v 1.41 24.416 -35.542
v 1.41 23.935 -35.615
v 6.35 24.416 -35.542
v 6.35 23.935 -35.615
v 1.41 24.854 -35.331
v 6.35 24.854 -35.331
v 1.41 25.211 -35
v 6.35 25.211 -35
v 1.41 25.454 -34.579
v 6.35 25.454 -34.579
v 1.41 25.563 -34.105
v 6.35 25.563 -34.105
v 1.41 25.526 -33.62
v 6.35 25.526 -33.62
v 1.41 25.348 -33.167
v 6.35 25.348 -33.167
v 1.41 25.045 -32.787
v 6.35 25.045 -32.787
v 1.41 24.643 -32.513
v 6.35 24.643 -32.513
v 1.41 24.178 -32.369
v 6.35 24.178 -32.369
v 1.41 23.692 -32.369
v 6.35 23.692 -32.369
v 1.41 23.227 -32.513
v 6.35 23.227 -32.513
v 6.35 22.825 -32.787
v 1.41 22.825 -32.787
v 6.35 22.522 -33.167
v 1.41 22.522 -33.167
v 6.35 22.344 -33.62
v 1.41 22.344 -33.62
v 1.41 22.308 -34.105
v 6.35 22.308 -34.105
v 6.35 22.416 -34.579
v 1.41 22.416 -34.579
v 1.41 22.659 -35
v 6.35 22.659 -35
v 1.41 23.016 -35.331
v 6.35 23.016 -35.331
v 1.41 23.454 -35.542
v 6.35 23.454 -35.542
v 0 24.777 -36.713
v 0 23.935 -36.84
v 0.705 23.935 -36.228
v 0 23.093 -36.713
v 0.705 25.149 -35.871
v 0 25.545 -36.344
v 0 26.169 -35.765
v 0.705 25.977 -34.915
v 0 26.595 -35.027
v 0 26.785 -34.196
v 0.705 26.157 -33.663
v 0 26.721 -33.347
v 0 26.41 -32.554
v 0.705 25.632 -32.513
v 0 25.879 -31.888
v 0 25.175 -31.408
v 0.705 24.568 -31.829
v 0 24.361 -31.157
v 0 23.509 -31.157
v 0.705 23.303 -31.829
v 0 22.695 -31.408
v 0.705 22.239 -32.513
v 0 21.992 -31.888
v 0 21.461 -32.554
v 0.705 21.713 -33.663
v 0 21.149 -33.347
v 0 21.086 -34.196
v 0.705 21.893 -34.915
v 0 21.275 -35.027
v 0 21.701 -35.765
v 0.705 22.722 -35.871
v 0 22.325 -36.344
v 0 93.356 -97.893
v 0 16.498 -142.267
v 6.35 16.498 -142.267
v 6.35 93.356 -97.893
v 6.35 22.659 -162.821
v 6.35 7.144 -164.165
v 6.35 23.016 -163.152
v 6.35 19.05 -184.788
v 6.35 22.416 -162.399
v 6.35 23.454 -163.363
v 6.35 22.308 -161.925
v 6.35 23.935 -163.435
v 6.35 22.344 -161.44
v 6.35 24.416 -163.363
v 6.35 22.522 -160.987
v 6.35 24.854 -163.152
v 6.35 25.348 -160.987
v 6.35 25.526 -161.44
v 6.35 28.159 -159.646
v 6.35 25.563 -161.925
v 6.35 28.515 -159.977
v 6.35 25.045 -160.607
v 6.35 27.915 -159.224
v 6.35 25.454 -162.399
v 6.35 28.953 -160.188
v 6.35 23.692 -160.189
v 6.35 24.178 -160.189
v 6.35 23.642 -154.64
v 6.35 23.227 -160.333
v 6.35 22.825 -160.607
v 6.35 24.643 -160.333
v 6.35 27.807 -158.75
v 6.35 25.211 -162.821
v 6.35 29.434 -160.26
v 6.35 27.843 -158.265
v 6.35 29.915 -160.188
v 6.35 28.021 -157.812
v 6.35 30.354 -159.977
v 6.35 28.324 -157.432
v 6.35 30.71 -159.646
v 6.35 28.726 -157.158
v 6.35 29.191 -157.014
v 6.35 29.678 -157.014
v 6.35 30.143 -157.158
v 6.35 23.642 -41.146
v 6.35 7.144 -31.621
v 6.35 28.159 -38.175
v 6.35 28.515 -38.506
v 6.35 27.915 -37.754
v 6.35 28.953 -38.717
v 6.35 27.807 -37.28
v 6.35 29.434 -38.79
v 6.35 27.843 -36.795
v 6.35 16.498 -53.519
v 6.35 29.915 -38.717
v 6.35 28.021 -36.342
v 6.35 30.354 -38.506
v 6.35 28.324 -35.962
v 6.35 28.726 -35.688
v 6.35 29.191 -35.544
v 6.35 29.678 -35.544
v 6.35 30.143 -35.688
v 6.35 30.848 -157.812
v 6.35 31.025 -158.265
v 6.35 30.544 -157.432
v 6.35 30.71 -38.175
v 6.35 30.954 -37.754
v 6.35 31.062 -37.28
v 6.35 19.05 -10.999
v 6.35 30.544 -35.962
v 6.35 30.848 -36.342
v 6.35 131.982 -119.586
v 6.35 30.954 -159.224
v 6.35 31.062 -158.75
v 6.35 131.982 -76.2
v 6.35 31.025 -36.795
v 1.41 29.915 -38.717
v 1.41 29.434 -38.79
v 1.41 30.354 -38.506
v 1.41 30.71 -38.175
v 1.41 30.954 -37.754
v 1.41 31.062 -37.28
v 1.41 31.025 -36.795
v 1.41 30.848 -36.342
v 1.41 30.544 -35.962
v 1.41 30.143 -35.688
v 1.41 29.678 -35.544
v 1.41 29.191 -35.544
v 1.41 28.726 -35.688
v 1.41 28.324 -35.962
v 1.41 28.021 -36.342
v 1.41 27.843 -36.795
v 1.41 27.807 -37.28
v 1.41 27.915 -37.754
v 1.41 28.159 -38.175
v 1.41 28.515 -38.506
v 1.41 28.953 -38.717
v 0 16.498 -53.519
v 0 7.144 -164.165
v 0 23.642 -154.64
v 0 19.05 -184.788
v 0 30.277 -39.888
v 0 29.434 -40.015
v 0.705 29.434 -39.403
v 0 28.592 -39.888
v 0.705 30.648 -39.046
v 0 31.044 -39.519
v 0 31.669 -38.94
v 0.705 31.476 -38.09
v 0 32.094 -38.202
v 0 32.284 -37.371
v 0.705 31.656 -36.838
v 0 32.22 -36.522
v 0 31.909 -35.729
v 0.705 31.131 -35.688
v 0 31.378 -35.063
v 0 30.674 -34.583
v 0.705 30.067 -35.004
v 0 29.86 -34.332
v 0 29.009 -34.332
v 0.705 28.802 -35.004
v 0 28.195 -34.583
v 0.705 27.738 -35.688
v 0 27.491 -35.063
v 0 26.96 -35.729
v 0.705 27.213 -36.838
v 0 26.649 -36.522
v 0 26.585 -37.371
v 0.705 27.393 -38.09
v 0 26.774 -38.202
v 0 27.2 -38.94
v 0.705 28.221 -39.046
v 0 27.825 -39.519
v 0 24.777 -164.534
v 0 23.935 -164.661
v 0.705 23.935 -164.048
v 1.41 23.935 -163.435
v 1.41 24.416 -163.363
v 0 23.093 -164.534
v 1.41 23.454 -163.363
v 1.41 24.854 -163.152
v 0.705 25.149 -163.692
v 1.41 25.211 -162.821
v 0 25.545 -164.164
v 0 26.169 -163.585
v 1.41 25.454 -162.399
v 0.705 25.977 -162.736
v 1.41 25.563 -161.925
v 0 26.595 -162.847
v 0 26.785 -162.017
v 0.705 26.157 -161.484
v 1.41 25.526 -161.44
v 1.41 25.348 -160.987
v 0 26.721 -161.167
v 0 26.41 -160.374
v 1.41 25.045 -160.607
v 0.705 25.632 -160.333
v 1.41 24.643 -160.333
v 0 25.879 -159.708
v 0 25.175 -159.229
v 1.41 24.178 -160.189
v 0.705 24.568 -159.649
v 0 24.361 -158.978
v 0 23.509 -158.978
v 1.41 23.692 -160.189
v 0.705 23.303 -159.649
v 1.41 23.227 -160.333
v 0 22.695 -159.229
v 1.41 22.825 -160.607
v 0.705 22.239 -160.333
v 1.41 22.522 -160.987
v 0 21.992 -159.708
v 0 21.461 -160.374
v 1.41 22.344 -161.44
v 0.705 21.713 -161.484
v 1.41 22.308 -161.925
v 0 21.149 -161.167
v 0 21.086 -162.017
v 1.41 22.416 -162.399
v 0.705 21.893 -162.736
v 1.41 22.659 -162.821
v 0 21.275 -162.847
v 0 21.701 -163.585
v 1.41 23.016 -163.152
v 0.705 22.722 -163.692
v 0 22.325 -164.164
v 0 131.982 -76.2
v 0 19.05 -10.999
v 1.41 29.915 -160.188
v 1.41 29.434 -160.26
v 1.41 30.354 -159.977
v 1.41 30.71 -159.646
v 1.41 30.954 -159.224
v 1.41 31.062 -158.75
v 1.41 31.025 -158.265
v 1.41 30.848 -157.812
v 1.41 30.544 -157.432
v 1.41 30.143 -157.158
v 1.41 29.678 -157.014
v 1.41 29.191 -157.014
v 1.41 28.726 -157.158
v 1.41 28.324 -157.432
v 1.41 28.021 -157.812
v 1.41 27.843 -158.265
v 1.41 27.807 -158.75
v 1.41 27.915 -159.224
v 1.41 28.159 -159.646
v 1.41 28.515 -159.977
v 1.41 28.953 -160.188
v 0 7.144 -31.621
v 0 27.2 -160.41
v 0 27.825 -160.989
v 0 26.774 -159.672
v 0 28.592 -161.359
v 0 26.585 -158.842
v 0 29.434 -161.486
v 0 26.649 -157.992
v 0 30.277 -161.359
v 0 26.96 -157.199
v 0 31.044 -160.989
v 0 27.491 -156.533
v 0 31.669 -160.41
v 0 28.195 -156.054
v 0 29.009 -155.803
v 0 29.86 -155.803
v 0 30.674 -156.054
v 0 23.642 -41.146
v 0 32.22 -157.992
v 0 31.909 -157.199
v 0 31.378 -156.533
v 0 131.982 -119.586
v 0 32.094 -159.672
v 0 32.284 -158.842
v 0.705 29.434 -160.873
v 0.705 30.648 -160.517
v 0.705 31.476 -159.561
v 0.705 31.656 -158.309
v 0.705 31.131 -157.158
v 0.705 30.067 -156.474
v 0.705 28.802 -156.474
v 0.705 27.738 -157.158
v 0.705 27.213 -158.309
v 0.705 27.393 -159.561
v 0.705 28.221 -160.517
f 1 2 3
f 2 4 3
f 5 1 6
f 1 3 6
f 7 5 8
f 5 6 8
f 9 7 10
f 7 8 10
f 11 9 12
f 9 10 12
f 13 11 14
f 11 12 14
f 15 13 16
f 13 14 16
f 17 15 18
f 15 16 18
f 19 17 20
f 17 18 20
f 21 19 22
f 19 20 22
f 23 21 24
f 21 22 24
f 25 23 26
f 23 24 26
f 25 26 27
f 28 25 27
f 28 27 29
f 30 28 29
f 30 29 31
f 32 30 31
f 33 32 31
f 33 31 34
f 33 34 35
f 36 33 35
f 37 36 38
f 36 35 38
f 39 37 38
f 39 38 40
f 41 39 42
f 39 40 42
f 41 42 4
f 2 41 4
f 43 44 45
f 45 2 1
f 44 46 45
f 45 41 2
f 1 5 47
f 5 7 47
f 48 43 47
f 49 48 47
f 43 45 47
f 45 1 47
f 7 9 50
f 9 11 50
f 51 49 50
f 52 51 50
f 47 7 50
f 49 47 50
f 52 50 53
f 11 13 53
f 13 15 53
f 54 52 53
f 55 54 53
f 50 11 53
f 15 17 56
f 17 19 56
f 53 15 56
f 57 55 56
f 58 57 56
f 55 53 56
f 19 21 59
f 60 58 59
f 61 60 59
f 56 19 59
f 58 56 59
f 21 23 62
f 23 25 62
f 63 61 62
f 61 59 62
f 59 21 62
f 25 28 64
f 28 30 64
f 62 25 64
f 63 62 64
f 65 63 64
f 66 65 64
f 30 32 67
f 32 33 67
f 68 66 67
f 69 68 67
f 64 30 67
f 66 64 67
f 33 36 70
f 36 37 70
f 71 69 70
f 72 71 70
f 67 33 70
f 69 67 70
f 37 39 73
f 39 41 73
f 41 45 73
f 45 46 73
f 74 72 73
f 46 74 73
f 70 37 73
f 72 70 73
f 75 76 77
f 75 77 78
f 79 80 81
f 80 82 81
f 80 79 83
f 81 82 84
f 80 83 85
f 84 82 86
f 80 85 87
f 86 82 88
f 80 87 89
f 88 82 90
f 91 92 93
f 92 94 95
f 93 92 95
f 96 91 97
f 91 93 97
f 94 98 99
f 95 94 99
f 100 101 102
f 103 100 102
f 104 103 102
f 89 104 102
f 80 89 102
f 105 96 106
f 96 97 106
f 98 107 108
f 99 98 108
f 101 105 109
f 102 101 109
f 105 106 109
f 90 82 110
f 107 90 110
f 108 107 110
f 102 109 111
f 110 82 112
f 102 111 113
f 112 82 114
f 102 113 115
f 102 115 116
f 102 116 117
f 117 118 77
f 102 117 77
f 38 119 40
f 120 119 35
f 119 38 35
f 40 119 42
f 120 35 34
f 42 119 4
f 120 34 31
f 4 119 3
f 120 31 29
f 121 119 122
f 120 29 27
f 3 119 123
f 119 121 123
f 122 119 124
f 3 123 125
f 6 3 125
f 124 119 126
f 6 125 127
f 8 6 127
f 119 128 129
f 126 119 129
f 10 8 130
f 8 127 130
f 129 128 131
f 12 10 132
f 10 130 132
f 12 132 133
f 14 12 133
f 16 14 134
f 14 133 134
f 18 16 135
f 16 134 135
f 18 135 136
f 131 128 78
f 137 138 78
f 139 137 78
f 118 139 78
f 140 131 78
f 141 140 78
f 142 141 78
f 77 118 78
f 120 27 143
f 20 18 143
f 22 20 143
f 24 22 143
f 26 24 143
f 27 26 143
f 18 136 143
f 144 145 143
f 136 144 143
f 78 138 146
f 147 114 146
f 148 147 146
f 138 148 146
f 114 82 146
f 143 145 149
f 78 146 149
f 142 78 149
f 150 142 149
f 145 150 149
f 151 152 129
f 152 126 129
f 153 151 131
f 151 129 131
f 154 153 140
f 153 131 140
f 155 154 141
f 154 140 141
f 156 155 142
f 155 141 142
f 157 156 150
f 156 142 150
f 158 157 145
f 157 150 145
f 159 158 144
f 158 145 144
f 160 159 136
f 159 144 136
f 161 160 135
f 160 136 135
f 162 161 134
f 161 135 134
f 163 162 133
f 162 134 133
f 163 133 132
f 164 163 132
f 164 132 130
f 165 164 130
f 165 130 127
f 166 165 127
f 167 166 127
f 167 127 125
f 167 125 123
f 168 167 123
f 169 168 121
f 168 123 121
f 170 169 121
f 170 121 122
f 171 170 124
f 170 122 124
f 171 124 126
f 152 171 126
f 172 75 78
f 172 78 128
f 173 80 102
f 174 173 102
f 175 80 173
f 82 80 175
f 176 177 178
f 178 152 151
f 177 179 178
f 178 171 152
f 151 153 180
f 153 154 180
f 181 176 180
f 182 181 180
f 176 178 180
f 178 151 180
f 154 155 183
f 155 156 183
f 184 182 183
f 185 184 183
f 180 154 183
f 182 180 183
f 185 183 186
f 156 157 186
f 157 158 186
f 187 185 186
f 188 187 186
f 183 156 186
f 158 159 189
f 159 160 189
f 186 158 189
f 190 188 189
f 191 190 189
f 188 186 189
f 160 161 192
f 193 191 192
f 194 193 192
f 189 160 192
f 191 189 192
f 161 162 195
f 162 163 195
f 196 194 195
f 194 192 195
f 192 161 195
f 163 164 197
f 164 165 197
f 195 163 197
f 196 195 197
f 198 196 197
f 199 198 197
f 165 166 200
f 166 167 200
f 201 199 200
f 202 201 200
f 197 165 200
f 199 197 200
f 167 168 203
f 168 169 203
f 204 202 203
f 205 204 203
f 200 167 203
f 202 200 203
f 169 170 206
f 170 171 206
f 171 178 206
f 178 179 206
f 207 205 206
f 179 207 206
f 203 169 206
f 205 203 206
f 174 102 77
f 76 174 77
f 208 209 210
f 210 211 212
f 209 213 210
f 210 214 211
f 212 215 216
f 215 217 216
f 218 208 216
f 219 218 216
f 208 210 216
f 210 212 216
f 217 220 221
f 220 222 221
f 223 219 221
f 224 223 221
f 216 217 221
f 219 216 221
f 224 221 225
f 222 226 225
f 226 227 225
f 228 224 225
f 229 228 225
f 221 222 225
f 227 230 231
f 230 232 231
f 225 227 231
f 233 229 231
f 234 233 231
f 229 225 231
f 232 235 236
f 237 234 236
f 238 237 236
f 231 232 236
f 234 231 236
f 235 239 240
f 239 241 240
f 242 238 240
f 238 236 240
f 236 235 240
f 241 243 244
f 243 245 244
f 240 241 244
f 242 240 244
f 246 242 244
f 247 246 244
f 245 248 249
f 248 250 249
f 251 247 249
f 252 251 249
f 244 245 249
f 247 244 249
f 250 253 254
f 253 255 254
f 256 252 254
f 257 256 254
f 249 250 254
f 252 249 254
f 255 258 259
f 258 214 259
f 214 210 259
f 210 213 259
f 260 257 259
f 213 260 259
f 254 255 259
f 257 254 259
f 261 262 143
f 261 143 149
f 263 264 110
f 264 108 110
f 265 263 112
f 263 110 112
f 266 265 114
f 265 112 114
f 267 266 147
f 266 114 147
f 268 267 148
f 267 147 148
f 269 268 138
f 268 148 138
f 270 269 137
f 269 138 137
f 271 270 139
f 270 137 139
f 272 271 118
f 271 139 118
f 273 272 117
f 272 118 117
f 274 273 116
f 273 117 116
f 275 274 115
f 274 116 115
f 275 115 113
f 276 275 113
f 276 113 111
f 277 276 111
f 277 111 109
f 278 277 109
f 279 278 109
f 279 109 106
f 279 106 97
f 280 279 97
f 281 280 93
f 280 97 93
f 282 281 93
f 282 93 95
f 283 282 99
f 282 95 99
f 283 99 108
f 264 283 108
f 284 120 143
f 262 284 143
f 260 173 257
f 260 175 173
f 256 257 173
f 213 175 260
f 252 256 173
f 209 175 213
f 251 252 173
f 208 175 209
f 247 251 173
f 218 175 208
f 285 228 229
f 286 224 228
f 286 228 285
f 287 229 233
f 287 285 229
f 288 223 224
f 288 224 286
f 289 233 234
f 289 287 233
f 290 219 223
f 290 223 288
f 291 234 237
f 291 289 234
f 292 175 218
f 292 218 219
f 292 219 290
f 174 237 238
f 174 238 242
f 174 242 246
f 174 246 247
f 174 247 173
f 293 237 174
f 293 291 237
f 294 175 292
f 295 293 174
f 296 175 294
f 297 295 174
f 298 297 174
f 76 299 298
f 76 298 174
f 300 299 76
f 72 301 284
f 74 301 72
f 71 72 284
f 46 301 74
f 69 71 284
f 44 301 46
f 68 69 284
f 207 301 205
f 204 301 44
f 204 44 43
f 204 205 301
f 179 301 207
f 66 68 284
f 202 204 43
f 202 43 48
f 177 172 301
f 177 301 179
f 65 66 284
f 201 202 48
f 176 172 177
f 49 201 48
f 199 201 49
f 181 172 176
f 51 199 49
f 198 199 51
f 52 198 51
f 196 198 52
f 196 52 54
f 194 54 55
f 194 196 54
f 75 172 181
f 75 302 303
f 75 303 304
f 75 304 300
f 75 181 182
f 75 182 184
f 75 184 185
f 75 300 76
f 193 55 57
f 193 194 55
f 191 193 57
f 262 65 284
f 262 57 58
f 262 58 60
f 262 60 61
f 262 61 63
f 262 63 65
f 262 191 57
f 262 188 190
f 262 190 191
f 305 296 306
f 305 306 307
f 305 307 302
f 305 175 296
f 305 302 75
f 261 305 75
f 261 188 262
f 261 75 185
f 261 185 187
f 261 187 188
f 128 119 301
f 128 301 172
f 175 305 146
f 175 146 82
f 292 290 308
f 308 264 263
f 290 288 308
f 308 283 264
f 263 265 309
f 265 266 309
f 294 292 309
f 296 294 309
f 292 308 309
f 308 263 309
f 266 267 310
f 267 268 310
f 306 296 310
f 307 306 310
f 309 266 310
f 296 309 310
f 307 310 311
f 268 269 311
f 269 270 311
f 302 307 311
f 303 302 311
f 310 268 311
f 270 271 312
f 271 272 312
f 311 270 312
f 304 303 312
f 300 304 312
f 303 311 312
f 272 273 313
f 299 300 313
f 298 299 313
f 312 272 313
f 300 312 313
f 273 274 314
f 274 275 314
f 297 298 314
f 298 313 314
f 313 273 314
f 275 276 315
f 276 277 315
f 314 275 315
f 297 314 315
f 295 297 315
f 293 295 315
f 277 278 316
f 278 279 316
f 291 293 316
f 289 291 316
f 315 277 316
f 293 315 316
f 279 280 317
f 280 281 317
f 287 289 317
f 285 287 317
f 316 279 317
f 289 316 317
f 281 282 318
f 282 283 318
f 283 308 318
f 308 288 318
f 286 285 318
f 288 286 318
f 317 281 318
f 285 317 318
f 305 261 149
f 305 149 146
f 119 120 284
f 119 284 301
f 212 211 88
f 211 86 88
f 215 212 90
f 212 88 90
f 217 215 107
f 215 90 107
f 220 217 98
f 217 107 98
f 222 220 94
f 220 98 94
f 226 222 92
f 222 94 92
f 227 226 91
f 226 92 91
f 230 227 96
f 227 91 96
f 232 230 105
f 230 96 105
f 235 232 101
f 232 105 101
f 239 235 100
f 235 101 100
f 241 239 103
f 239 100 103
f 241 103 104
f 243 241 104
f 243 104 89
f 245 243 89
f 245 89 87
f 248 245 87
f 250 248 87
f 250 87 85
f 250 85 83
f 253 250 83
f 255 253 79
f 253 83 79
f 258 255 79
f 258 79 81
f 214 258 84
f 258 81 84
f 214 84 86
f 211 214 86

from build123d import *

# Parameters (mm, degrees)
BOSS_EXTRUDE1_DEPTH                            = 6.35
CUT_EXTRUDE1_DEPTH                             = 237.202948439
CUT_EXTRUDE2_DEPTH                             = 237.202948439
CUT_EXTRUDE3_DEPTH                             = 237.202948439
CUT_EXTRUDE4_DEPTH                             = 228.16972734
CSK_FOR_4_FLAT_HEAD_MACHINE_SCREW1_D           = 3.2639
CSK_FOR_4_FLAT_HEAD_MACHINE_SCREW1_CSINK_D     = 5.715
CSK_FOR_4_FLAT_HEAD_MACHINE_SCREW1_CSINK_ANGLE = 82
CSK_FOR_4_FLAT_HEAD_MACHINE_SCREW2_D           = 3.2639
CSK_FOR_4_FLAT_HEAD_MACHINE_SCREW2_CSINK_D     = 5.715
CSK_FOR_4_FLAT_HEAD_MACHINE_SCREW2_CSINK_ANGLE = 82
CSK_FOR_4_FLAT_HEAD_MACHINE_SCREW3_D           = 3.2639
CSK_FOR_4_FLAT_HEAD_MACHINE_SCREW3_CSINK_D     = 5.715
CSK_FOR_4_FLAT_HEAD_MACHINE_SCREW3_CSINK_ANGLE = 82


with BuildPart() as part:
    # Sketch1 → Boss-Extrude1 (new body)
    with BuildSketch(Plane(origin=(0, 0, 0), x_dir=(0, 0, -1), z_dir=(1, 0, 0))):
        Polygon((0, 0), (76.2, 131.982271537), (119.58608314, 131.982271537), (195.78608314, 0), (151.791992628, 0), (97.89304157, 93.355721707), (43.994090512, 0), align=None)
    extrude(amount=BOSS_EXTRUDE1_DEPTH)

    # Sketch2 → Cut-Extrude1 (cut, through all)
    with BuildSketch(Plane(origin=(6.35, 0, 0), x_dir=(0, 0, -1), z_dir=(1, 0, 0))):
        Polygon((43.994090512, 0), (10.998522628, 19.05), (0, 0), align=None)
    extrude(amount=-CUT_EXTRUDE1_DEPTH, mode=Mode.SUBTRACT)

    # Sketch3 → Cut-Extrude2 (cut, through all)
    with BuildSketch(Plane(origin=(6.35, 0, 0), x_dir=(0, 0, -1), z_dir=(1, 0, 0))):
        Polygon((43.994090512, 0), (31.620752556, 7.14375), (41.145752556, 23.641533942), (53.519090512, 16.497783942), align=None)
    extrude(amount=-CUT_EXTRUDE2_DEPTH, mode=Mode.SUBTRACT)

    # Sketch4 → Cut-Extrude3 (cut, through all)
    with BuildSketch(Plane(origin=(6.35, 0, 0), x_dir=(0, 0, -1), z_dir=(1, 0, 0))):
        Polygon((151.791992628, 0), (184.787560512, 19.05), (195.78608314, 0), align=None)
    extrude(amount=-CUT_EXTRUDE3_DEPTH, mode=Mode.SUBTRACT)

    # Sketch5 → Cut-Extrude4 (cut, through all)
    with BuildSketch(Plane(origin=(6.35, 0, 0), x_dir=(0, 0, -1), z_dir=(1, 0, 0))):
        Polygon((151.791992628, 0), (164.165330584, 7.14375), (154.640330584, 23.641533942), (142.266992628, 16.497783942), align=None)
    extrude(amount=-CUT_EXTRUDE4_DEPTH, mode=Mode.SUBTRACT)

    # CSK for #4 Flat Head Machine Screw1 (through all)
    with Locations(Plane.ZY):
        with Locations((-161.803140841, 23.935182653)):
            CounterSinkHole(CSK_FOR_4_FLAT_HEAD_MACHINE_SCREW1_D / 2, CSK_FOR_4_FLAT_HEAD_MACHINE_SCREW1_CSINK_D / 2, counter_sink_angle=CSK_FOR_4_FLAT_HEAD_MACHINE_SCREW1_CSINK_ANGLE)

    # CSK for #4 Flat Head Machine Screw2 (through all)
    with Locations(Plane.ZY):
        with Locations((-158.628140841, 29.434443967)):
            CounterSinkHole(CSK_FOR_4_FLAT_HEAD_MACHINE_SCREW2_D / 2, CSK_FOR_4_FLAT_HEAD_MACHINE_SCREW2_CSINK_D / 2, counter_sink_angle=CSK_FOR_4_FLAT_HEAD_MACHINE_SCREW2_CSINK_ANGLE)

    # CSK for #4 Flat Head Machine Screw3 (through all)
    with Locations(Plane.ZY):
        with Locations((-37.157942299, 29.434443967), (-33.982942299, 23.935182653)):
            CounterSinkHole(CSK_FOR_4_FLAT_HEAD_MACHINE_SCREW3_D / 2, CSK_FOR_4_FLAT_HEAD_MACHINE_SCREW3_CSINK_D / 2, counter_sink_angle=CSK_FOR_4_FLAT_HEAD_MACHINE_SCREW3_CSINK_ANGLE)


solid = part.part
